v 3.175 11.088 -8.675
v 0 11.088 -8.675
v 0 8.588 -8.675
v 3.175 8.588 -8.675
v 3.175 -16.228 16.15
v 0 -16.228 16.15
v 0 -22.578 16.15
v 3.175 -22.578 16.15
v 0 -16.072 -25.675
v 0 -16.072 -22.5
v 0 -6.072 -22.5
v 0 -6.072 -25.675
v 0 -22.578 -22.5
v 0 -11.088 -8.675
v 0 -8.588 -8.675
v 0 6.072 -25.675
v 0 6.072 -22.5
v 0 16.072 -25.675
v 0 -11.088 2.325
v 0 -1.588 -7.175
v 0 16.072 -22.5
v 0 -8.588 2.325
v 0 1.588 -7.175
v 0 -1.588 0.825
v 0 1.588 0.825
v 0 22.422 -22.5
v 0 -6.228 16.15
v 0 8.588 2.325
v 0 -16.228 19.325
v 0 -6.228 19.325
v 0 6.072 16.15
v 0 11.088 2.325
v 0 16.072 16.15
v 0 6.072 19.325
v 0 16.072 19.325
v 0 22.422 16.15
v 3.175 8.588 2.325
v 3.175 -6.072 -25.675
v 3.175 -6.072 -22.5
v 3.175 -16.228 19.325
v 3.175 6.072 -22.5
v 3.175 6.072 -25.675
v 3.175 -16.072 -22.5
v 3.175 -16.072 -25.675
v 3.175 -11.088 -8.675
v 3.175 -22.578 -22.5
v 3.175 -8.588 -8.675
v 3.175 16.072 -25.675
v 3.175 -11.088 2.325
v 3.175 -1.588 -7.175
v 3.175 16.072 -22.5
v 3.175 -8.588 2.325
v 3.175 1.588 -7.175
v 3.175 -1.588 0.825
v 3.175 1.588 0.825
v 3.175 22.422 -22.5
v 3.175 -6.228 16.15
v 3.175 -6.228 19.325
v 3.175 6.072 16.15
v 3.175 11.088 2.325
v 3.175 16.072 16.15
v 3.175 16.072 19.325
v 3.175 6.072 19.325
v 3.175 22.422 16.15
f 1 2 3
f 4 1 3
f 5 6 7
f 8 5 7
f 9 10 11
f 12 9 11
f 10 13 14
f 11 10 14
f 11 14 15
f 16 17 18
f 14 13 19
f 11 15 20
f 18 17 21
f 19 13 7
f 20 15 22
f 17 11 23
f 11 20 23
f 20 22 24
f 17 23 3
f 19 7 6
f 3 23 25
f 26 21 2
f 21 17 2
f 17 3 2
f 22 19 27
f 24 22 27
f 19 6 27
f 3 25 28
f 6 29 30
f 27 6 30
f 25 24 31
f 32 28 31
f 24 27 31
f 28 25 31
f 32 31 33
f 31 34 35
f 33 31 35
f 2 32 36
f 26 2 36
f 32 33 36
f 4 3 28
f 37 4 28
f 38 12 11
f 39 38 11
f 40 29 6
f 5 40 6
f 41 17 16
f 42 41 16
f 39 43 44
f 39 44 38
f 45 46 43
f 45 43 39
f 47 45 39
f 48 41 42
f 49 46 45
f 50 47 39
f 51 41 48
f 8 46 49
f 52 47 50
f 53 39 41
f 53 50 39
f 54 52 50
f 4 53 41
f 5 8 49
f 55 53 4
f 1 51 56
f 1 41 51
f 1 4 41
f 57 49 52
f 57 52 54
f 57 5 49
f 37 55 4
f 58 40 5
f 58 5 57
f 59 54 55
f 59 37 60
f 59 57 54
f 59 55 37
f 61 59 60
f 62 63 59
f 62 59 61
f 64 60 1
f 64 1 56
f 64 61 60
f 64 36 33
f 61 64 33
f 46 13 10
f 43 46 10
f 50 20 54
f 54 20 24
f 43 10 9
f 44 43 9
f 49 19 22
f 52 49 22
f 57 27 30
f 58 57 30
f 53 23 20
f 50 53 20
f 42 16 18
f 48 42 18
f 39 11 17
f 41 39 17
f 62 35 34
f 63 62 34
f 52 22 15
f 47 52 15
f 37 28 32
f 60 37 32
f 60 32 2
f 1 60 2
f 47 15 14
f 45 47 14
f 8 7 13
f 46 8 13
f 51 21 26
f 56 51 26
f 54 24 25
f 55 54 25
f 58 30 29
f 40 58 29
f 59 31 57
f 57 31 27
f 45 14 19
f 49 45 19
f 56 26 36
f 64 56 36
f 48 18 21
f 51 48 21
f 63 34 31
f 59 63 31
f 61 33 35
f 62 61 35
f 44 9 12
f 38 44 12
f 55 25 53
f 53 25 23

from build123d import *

# Parameters (mm, degrees)
F1_DEPTH = 3.175


# Not quite as in the source:
# - a length typed as a fraction of an inch, garbled in the dataset ("3 / 203.2 mm" for 3/8 in), is restored


with BuildPart() as f1:
    # F0 (on Right) → F1 (new body)
    with BuildSketch(Plane.YZ):
        Polygon((16.0724163434, -25.675), (16.0724163434, -22.5), (22.4224163434, -22.5), (22.4224163434, 16.15), (16.0724163434, 16.15), (16.0724163434, 19.325), (6.0724163434, 19.325), (6.0724163434, 16.15), (-6.2275836566, 16.15), (-6.2275836566, 19.325), (-16.2275836566, 19.325), (-16.2275836566, 16.15), (-19.4025836566, 16.15), (-19.325, -22.5), (-16.0724163434, -22.5), (-16.0724163434, -25.675), (-6.0724163434, -25.675), (-6.0724163434, -24.0875), (-6.0724163434, -22.5), (6.0724163434, -22.5), (6.0724163434, -24.0875), (6.0724163434, -25.675), align=None)
        Polygon((-8.5875, 2.325), (-8.5875, -3.175), (-8.5875, -8.675), (-11.0875, -8.675), (-11.0875, 2.325), align=None, mode=Mode.SUBTRACT)
        Polygon((1.5875, -3.175), (1.5875, -7.175), (-1.5875, -7.175), (-1.5875, -3.175), (-1.5875, 0.825), (1.5875, 0.825), align=None, mode=Mode.SUBTRACT)
        Polygon((8.5875, -8.675), (8.5875, -3.175), (8.5875, 2.325), (11.0875, 2.325), (11.0875, -8.675), align=None, mode=Mode.SUBTRACT)
        Polygon((-22.5775836566, -22.5), (-19.325, -22.5), (-19.4025836566, 16.15), (-22.5775836566, 16.15), align=None)
    extrude(amount=F1_DEPTH)


solid = f1.part
